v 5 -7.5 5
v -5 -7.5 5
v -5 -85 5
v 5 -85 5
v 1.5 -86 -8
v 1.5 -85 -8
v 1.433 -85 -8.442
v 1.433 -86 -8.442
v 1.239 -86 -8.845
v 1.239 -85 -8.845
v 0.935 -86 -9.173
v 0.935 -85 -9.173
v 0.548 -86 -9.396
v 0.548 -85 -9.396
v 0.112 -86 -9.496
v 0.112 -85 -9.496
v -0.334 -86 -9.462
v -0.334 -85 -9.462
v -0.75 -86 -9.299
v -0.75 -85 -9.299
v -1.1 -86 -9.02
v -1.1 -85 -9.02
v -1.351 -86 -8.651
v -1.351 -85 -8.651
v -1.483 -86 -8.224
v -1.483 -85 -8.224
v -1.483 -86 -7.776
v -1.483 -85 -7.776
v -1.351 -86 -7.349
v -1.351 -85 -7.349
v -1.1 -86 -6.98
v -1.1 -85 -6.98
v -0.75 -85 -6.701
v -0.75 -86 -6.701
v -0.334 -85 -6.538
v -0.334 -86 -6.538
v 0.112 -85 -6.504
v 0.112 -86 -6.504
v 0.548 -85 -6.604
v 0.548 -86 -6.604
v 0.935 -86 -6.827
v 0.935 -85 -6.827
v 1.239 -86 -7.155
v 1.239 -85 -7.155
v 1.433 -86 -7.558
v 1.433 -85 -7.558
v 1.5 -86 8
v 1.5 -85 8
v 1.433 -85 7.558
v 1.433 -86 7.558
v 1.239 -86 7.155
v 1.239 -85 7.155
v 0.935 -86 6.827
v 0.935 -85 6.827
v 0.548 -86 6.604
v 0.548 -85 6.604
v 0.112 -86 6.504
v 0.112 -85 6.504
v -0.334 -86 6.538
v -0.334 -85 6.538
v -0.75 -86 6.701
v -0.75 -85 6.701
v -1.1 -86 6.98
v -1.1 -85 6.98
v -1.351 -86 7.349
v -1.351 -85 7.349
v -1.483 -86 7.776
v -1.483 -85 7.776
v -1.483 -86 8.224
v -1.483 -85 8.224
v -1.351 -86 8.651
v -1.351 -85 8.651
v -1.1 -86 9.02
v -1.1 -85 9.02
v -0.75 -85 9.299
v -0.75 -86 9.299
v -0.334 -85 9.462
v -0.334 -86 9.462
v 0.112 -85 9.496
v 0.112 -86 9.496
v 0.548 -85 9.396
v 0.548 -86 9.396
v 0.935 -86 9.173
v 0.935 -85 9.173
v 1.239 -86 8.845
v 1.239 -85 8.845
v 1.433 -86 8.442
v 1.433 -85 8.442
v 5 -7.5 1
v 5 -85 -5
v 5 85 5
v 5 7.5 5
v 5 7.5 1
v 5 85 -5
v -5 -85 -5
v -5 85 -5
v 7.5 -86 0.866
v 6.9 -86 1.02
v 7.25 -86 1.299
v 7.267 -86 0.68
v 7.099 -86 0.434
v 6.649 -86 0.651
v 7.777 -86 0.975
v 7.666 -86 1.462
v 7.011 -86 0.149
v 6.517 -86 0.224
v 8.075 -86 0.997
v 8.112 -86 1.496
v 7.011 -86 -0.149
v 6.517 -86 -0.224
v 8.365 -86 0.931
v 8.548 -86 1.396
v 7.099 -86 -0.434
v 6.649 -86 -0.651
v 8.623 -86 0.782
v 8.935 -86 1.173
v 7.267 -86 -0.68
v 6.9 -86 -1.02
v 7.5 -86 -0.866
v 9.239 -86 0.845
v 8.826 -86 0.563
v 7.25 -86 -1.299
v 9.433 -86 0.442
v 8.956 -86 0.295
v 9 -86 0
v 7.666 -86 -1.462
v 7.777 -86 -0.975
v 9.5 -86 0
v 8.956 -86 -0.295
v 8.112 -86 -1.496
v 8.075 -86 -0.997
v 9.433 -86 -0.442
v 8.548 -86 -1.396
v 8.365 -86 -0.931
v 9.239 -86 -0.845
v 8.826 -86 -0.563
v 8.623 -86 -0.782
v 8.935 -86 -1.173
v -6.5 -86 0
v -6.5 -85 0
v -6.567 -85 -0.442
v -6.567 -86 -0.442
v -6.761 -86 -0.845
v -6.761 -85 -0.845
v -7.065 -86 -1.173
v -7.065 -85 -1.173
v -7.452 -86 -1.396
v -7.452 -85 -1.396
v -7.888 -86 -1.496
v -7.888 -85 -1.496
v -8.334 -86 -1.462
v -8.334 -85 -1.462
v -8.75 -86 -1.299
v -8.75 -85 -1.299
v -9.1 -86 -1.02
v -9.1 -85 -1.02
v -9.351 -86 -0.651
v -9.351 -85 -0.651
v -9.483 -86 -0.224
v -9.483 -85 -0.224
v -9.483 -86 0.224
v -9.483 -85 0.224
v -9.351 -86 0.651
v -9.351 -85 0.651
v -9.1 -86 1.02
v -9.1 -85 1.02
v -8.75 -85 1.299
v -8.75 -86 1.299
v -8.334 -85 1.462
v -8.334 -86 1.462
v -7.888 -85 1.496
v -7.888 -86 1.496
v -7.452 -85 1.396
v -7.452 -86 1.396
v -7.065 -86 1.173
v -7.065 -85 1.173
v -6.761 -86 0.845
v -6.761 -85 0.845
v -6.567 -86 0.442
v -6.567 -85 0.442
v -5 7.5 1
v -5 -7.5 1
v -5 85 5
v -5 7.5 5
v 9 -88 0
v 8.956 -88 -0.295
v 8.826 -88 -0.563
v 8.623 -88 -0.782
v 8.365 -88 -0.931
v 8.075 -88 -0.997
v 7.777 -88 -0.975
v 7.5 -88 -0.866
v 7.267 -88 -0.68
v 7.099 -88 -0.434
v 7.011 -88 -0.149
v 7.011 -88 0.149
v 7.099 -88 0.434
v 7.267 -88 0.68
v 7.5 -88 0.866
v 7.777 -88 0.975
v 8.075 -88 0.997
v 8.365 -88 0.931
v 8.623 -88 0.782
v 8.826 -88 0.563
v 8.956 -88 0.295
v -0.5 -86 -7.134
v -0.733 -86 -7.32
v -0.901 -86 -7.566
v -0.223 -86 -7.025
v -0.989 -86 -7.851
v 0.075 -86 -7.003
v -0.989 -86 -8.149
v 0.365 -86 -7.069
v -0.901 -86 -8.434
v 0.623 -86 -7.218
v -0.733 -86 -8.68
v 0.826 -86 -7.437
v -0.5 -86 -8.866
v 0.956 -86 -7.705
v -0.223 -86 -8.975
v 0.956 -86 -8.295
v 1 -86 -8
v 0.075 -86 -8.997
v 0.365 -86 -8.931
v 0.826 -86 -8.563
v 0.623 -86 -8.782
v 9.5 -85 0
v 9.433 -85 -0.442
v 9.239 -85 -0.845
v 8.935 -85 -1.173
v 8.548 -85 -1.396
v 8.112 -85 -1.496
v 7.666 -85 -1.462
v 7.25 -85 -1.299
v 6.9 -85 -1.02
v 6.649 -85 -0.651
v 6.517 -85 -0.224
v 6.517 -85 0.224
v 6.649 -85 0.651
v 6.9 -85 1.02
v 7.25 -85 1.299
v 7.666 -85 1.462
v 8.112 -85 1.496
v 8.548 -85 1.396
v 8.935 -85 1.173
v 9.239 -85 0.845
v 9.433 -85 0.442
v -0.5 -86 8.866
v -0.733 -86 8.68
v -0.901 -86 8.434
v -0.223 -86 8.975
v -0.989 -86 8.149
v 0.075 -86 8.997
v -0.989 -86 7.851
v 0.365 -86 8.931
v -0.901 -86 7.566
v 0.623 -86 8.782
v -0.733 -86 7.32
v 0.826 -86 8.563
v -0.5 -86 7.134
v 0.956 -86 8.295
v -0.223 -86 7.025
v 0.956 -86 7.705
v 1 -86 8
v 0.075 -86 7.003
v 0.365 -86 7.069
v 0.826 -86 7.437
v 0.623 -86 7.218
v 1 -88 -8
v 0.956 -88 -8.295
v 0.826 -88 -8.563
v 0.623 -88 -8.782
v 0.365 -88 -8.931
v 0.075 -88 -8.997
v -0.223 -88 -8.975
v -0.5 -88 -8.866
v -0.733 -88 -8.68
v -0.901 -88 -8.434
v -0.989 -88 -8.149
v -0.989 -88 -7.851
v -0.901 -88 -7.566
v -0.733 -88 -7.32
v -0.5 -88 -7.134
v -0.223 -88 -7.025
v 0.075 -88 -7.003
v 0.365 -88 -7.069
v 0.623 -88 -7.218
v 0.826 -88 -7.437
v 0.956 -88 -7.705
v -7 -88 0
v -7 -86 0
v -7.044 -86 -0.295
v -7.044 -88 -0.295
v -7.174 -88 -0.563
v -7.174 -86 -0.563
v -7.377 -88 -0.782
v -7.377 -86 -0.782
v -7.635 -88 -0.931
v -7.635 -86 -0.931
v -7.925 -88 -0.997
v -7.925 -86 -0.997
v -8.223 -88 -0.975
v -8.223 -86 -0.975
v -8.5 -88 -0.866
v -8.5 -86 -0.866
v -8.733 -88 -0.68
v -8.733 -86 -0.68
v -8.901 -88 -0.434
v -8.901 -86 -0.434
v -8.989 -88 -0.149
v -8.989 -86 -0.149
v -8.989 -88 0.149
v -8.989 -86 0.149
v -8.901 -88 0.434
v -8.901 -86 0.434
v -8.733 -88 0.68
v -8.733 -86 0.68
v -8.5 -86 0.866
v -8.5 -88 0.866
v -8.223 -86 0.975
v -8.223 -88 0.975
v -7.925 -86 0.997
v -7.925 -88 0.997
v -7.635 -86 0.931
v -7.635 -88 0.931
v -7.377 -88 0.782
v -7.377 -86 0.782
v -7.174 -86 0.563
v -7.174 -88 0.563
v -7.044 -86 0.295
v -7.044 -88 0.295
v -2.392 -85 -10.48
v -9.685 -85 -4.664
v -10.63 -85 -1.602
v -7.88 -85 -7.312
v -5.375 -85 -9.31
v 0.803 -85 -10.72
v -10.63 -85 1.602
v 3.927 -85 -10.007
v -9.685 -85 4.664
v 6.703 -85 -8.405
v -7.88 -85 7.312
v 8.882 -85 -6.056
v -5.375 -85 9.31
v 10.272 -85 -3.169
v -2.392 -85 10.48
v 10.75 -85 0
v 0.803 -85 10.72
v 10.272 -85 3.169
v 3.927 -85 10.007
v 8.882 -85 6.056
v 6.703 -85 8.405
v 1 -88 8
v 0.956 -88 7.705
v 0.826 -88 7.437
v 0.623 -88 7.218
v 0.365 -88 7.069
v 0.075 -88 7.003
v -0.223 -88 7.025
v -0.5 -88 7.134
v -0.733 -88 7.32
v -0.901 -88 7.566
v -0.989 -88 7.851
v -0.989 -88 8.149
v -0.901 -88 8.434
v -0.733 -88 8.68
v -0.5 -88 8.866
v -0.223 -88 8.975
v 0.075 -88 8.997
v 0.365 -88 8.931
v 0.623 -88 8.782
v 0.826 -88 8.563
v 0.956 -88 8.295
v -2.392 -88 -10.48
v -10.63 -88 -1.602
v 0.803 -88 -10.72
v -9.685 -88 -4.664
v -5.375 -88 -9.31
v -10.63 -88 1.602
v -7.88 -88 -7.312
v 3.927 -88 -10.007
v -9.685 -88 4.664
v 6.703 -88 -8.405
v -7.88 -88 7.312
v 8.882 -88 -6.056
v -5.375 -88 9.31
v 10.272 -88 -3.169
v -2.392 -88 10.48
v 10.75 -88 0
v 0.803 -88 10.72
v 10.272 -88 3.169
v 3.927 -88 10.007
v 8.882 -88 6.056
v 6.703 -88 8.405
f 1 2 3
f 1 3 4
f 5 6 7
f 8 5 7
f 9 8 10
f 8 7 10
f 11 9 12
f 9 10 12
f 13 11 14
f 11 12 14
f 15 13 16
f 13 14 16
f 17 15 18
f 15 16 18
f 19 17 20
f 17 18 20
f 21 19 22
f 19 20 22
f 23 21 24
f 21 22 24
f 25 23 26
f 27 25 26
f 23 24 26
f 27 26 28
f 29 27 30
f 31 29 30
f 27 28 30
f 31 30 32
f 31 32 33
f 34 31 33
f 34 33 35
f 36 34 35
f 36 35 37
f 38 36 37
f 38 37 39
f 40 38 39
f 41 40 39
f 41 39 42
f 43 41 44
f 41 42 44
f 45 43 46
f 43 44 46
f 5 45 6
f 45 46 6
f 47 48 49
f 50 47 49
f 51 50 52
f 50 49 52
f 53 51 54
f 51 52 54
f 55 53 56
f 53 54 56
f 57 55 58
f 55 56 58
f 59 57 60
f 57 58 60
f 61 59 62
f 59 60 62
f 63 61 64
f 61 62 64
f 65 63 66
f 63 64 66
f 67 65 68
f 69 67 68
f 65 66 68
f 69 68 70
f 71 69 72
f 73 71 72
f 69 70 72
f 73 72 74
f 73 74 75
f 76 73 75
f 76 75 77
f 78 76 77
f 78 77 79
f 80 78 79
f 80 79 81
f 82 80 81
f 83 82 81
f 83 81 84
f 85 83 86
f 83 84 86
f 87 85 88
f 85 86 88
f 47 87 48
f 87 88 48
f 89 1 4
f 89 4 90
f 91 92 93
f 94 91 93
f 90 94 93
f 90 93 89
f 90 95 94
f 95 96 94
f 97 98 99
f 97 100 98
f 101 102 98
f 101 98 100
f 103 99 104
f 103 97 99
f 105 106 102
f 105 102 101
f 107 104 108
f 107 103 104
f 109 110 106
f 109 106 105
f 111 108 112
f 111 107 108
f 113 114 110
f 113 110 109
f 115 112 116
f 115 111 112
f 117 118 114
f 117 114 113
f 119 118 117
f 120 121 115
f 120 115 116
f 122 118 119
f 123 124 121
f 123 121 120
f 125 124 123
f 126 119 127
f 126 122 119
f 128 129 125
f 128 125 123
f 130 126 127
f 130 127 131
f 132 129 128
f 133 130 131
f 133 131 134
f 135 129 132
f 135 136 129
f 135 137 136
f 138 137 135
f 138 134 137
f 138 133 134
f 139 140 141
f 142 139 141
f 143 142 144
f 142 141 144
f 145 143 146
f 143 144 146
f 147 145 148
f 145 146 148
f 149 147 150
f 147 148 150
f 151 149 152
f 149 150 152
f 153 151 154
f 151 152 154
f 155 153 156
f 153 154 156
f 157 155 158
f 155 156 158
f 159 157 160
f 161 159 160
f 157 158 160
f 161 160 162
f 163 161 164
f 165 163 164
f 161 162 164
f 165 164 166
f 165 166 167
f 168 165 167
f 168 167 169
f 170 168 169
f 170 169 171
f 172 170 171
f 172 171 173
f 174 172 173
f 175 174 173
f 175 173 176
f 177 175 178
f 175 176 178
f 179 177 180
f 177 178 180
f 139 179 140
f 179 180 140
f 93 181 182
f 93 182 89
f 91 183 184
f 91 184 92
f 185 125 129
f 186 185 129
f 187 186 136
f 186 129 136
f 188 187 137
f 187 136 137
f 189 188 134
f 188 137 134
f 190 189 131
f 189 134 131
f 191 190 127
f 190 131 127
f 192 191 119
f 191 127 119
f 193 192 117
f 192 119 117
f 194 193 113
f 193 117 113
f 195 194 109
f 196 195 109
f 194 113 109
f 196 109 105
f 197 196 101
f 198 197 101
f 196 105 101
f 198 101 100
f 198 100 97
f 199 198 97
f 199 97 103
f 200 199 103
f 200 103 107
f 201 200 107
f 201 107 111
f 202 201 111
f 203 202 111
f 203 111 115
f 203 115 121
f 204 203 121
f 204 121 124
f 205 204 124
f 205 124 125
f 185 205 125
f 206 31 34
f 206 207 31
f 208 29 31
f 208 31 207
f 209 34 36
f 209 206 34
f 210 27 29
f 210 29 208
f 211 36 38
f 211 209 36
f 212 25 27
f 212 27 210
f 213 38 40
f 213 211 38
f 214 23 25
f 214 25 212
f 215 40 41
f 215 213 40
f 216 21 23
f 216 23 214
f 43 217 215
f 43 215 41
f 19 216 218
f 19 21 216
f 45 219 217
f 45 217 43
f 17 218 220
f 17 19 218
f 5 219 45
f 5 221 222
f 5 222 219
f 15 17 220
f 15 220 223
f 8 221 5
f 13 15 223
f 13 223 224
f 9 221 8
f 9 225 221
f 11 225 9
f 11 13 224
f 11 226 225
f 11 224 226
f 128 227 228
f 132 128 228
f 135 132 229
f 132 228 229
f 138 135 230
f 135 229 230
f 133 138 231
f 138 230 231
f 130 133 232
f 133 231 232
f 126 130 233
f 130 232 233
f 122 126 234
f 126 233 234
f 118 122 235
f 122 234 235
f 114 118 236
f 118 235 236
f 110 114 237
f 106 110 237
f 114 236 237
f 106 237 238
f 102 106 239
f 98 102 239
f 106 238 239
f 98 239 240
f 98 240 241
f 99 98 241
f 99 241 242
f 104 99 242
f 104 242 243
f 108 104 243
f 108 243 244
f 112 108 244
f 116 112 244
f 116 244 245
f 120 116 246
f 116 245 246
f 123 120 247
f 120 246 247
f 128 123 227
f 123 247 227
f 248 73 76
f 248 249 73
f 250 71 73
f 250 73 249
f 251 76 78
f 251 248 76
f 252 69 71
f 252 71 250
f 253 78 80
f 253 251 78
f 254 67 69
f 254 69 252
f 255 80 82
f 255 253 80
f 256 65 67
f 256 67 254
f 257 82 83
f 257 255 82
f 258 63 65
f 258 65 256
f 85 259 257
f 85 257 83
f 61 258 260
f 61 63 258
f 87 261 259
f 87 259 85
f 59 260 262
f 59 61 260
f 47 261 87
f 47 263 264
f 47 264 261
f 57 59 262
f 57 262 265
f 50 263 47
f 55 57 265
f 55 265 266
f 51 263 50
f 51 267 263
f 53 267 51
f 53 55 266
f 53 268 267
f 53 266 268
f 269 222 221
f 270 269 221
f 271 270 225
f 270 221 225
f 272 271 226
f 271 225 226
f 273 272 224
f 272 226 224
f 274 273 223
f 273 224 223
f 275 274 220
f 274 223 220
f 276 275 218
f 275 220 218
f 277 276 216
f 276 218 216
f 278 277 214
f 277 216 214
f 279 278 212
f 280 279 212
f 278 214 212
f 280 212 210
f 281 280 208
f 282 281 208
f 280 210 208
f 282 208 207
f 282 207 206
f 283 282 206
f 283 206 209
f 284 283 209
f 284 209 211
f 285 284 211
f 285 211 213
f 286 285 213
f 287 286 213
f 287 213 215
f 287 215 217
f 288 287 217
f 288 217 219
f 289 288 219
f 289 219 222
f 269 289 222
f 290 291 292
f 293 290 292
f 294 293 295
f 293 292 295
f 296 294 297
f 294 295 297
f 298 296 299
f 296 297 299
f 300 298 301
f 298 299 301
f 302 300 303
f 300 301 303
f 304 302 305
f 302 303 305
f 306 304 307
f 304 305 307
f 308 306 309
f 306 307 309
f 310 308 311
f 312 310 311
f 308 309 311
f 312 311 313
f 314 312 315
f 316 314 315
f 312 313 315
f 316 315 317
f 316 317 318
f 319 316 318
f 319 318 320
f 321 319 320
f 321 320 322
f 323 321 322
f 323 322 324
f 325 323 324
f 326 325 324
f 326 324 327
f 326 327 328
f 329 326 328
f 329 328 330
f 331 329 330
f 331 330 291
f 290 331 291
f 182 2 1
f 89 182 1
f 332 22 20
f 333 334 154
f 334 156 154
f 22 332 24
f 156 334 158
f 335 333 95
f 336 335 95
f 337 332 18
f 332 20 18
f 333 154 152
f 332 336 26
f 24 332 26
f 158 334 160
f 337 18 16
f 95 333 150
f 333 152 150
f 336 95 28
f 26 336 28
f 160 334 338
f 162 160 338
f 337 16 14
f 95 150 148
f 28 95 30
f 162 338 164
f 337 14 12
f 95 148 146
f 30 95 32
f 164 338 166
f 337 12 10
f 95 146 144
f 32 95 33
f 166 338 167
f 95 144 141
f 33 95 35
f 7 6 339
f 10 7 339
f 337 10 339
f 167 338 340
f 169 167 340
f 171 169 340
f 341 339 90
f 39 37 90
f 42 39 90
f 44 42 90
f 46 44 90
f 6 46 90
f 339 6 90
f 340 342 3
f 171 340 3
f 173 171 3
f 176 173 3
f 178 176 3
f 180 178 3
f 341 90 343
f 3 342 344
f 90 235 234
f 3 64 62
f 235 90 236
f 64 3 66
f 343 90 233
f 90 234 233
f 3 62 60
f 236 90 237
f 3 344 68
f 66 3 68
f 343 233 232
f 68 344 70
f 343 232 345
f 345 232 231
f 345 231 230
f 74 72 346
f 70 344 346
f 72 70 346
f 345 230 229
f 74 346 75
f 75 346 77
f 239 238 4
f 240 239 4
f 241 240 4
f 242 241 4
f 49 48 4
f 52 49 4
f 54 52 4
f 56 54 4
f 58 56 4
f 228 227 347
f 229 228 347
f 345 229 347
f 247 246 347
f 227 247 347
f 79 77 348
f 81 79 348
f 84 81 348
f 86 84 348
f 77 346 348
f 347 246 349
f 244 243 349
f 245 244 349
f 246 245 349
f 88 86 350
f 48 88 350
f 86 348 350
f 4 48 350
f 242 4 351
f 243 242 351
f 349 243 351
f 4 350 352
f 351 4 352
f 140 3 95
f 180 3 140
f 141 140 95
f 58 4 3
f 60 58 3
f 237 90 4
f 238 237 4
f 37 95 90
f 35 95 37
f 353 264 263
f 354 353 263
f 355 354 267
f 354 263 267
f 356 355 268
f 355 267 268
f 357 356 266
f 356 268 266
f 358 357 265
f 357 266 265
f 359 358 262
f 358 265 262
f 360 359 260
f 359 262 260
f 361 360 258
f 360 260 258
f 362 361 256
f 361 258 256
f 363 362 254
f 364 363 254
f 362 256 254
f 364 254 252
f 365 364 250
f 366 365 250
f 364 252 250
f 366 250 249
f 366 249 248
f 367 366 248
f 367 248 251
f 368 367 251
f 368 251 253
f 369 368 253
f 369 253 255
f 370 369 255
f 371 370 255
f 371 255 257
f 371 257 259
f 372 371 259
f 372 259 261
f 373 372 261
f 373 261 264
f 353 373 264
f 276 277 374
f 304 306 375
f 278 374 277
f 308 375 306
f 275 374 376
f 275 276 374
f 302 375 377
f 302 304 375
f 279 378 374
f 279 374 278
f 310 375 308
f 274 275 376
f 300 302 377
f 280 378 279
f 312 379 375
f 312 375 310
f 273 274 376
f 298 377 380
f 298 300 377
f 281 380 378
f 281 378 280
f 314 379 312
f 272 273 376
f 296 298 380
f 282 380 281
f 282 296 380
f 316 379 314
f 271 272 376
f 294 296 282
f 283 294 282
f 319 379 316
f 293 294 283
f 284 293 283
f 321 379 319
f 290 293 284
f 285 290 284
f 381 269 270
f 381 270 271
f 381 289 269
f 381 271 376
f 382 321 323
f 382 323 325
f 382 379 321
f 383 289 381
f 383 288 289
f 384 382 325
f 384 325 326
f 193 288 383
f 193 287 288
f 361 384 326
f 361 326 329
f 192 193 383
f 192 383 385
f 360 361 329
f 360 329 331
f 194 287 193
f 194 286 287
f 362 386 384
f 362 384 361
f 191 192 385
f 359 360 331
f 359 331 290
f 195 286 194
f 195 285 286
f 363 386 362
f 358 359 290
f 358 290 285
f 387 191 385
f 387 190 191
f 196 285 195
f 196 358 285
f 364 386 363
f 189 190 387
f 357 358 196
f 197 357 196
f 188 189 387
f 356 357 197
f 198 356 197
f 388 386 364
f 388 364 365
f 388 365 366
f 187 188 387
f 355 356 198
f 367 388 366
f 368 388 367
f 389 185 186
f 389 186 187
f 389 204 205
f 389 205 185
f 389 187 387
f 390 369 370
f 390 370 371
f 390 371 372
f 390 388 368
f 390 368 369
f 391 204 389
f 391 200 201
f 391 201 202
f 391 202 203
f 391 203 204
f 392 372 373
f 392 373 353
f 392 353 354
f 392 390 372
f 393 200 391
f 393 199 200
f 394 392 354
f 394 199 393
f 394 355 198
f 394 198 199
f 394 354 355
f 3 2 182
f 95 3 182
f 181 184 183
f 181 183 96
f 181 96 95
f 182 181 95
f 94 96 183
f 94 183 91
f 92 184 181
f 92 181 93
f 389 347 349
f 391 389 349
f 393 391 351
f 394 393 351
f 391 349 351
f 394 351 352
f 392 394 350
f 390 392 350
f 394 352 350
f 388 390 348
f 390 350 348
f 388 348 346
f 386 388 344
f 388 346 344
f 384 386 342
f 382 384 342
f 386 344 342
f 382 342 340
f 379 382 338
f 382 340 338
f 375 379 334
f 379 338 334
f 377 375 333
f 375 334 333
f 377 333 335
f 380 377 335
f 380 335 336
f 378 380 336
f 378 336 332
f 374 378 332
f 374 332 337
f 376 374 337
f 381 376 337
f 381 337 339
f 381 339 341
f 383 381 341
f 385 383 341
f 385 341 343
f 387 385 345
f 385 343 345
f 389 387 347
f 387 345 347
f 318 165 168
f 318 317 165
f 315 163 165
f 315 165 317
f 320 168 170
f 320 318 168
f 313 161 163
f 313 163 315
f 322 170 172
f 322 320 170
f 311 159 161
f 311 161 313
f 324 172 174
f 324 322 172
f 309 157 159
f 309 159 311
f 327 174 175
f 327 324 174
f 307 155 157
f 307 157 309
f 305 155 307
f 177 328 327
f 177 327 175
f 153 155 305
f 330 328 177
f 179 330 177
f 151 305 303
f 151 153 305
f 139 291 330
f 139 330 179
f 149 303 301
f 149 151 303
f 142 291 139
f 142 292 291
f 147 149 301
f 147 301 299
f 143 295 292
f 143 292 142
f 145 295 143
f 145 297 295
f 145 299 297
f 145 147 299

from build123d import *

# Parameters (mm, degrees)
SKETCH1_W           = 10
SKETCH1_H           = 10
BOSS_EXTRUDE1_DEPTH = 85
SKETCH2_W           = 10
SKETCH2_H           = 15
CUT_EXTRUDE1_DEPTH  = 4
SKETCH3_R           = 10.75
BOSS_EXTRUDE2_DEPTH = 3
SKETCH4_R           = 1
CUT_EXTRUDE2_DEPTH  = 3
SKETCH5_R           = 1.5
CUT_EXTRUDE3_DEPTH  = 1


with BuildPart() as part:
    # Sketch1 → Boss-Extrude1 (new body, symmetric)
    with BuildSketch(Plane(origin=(0, 0, 0), x_dir=(1, 0, 0), z_dir=(0, 1, 0))):
        Rectangle(SKETCH1_W, SKETCH1_H)
    extrude(amount=BOSS_EXTRUDE1_DEPTH, both=True)

    # Sketch2 → Cut-Extrude1 (cut)
    with BuildSketch(Plane.XY.offset(5)):
        Rectangle(SKETCH2_W, SKETCH2_H)
    extrude(amount=-CUT_EXTRUDE1_DEPTH, mode=Mode.SUBTRACT)

    # Sketch3 → Boss-Extrude2 (add)
    with BuildSketch(Plane.XZ.offset(85)):
        Circle(SKETCH3_R)
    extrude(amount=BOSS_EXTRUDE2_DEPTH)

    # Sketch4 → Cut-Extrude2 (cut)
    with BuildSketch(Plane(origin=(0, -85, 0), x_dir=(1, 0, 0), z_dir=(0, 1, 0))):
        with Locations((8, 0)):
            Circle(SKETCH4_R)
        with Locations((0, -8)):
            Circle(SKETCH4_R)
        with Locations((-8, 0)):
            Circle(SKETCH4_R)
        with Locations((0, 8)):
            Circle(SKETCH4_R)
    extrude(amount=-CUT_EXTRUDE2_DEPTH, mode=Mode.SUBTRACT)

    # Sketch5 → Cut-Extrude3 (cut)
    with BuildSketch(Plane(origin=(0, -85, 0), x_dir=(1, 0, 0), z_dir=(0, 1, 0))):
        with Locations((8, 0)):
            Circle(SKETCH5_R)
        with Locations((0, -8)):
            Circle(SKETCH5_R)
        with Locations((-8, 0)):
            Circle(SKETCH5_R)
        with Locations((0, 8)):
            Circle(SKETCH5_R)
    extrude(amount=-CUT_EXTRUDE3_DEPTH, mode=Mode.SUBTRACT)


solid = part.part
